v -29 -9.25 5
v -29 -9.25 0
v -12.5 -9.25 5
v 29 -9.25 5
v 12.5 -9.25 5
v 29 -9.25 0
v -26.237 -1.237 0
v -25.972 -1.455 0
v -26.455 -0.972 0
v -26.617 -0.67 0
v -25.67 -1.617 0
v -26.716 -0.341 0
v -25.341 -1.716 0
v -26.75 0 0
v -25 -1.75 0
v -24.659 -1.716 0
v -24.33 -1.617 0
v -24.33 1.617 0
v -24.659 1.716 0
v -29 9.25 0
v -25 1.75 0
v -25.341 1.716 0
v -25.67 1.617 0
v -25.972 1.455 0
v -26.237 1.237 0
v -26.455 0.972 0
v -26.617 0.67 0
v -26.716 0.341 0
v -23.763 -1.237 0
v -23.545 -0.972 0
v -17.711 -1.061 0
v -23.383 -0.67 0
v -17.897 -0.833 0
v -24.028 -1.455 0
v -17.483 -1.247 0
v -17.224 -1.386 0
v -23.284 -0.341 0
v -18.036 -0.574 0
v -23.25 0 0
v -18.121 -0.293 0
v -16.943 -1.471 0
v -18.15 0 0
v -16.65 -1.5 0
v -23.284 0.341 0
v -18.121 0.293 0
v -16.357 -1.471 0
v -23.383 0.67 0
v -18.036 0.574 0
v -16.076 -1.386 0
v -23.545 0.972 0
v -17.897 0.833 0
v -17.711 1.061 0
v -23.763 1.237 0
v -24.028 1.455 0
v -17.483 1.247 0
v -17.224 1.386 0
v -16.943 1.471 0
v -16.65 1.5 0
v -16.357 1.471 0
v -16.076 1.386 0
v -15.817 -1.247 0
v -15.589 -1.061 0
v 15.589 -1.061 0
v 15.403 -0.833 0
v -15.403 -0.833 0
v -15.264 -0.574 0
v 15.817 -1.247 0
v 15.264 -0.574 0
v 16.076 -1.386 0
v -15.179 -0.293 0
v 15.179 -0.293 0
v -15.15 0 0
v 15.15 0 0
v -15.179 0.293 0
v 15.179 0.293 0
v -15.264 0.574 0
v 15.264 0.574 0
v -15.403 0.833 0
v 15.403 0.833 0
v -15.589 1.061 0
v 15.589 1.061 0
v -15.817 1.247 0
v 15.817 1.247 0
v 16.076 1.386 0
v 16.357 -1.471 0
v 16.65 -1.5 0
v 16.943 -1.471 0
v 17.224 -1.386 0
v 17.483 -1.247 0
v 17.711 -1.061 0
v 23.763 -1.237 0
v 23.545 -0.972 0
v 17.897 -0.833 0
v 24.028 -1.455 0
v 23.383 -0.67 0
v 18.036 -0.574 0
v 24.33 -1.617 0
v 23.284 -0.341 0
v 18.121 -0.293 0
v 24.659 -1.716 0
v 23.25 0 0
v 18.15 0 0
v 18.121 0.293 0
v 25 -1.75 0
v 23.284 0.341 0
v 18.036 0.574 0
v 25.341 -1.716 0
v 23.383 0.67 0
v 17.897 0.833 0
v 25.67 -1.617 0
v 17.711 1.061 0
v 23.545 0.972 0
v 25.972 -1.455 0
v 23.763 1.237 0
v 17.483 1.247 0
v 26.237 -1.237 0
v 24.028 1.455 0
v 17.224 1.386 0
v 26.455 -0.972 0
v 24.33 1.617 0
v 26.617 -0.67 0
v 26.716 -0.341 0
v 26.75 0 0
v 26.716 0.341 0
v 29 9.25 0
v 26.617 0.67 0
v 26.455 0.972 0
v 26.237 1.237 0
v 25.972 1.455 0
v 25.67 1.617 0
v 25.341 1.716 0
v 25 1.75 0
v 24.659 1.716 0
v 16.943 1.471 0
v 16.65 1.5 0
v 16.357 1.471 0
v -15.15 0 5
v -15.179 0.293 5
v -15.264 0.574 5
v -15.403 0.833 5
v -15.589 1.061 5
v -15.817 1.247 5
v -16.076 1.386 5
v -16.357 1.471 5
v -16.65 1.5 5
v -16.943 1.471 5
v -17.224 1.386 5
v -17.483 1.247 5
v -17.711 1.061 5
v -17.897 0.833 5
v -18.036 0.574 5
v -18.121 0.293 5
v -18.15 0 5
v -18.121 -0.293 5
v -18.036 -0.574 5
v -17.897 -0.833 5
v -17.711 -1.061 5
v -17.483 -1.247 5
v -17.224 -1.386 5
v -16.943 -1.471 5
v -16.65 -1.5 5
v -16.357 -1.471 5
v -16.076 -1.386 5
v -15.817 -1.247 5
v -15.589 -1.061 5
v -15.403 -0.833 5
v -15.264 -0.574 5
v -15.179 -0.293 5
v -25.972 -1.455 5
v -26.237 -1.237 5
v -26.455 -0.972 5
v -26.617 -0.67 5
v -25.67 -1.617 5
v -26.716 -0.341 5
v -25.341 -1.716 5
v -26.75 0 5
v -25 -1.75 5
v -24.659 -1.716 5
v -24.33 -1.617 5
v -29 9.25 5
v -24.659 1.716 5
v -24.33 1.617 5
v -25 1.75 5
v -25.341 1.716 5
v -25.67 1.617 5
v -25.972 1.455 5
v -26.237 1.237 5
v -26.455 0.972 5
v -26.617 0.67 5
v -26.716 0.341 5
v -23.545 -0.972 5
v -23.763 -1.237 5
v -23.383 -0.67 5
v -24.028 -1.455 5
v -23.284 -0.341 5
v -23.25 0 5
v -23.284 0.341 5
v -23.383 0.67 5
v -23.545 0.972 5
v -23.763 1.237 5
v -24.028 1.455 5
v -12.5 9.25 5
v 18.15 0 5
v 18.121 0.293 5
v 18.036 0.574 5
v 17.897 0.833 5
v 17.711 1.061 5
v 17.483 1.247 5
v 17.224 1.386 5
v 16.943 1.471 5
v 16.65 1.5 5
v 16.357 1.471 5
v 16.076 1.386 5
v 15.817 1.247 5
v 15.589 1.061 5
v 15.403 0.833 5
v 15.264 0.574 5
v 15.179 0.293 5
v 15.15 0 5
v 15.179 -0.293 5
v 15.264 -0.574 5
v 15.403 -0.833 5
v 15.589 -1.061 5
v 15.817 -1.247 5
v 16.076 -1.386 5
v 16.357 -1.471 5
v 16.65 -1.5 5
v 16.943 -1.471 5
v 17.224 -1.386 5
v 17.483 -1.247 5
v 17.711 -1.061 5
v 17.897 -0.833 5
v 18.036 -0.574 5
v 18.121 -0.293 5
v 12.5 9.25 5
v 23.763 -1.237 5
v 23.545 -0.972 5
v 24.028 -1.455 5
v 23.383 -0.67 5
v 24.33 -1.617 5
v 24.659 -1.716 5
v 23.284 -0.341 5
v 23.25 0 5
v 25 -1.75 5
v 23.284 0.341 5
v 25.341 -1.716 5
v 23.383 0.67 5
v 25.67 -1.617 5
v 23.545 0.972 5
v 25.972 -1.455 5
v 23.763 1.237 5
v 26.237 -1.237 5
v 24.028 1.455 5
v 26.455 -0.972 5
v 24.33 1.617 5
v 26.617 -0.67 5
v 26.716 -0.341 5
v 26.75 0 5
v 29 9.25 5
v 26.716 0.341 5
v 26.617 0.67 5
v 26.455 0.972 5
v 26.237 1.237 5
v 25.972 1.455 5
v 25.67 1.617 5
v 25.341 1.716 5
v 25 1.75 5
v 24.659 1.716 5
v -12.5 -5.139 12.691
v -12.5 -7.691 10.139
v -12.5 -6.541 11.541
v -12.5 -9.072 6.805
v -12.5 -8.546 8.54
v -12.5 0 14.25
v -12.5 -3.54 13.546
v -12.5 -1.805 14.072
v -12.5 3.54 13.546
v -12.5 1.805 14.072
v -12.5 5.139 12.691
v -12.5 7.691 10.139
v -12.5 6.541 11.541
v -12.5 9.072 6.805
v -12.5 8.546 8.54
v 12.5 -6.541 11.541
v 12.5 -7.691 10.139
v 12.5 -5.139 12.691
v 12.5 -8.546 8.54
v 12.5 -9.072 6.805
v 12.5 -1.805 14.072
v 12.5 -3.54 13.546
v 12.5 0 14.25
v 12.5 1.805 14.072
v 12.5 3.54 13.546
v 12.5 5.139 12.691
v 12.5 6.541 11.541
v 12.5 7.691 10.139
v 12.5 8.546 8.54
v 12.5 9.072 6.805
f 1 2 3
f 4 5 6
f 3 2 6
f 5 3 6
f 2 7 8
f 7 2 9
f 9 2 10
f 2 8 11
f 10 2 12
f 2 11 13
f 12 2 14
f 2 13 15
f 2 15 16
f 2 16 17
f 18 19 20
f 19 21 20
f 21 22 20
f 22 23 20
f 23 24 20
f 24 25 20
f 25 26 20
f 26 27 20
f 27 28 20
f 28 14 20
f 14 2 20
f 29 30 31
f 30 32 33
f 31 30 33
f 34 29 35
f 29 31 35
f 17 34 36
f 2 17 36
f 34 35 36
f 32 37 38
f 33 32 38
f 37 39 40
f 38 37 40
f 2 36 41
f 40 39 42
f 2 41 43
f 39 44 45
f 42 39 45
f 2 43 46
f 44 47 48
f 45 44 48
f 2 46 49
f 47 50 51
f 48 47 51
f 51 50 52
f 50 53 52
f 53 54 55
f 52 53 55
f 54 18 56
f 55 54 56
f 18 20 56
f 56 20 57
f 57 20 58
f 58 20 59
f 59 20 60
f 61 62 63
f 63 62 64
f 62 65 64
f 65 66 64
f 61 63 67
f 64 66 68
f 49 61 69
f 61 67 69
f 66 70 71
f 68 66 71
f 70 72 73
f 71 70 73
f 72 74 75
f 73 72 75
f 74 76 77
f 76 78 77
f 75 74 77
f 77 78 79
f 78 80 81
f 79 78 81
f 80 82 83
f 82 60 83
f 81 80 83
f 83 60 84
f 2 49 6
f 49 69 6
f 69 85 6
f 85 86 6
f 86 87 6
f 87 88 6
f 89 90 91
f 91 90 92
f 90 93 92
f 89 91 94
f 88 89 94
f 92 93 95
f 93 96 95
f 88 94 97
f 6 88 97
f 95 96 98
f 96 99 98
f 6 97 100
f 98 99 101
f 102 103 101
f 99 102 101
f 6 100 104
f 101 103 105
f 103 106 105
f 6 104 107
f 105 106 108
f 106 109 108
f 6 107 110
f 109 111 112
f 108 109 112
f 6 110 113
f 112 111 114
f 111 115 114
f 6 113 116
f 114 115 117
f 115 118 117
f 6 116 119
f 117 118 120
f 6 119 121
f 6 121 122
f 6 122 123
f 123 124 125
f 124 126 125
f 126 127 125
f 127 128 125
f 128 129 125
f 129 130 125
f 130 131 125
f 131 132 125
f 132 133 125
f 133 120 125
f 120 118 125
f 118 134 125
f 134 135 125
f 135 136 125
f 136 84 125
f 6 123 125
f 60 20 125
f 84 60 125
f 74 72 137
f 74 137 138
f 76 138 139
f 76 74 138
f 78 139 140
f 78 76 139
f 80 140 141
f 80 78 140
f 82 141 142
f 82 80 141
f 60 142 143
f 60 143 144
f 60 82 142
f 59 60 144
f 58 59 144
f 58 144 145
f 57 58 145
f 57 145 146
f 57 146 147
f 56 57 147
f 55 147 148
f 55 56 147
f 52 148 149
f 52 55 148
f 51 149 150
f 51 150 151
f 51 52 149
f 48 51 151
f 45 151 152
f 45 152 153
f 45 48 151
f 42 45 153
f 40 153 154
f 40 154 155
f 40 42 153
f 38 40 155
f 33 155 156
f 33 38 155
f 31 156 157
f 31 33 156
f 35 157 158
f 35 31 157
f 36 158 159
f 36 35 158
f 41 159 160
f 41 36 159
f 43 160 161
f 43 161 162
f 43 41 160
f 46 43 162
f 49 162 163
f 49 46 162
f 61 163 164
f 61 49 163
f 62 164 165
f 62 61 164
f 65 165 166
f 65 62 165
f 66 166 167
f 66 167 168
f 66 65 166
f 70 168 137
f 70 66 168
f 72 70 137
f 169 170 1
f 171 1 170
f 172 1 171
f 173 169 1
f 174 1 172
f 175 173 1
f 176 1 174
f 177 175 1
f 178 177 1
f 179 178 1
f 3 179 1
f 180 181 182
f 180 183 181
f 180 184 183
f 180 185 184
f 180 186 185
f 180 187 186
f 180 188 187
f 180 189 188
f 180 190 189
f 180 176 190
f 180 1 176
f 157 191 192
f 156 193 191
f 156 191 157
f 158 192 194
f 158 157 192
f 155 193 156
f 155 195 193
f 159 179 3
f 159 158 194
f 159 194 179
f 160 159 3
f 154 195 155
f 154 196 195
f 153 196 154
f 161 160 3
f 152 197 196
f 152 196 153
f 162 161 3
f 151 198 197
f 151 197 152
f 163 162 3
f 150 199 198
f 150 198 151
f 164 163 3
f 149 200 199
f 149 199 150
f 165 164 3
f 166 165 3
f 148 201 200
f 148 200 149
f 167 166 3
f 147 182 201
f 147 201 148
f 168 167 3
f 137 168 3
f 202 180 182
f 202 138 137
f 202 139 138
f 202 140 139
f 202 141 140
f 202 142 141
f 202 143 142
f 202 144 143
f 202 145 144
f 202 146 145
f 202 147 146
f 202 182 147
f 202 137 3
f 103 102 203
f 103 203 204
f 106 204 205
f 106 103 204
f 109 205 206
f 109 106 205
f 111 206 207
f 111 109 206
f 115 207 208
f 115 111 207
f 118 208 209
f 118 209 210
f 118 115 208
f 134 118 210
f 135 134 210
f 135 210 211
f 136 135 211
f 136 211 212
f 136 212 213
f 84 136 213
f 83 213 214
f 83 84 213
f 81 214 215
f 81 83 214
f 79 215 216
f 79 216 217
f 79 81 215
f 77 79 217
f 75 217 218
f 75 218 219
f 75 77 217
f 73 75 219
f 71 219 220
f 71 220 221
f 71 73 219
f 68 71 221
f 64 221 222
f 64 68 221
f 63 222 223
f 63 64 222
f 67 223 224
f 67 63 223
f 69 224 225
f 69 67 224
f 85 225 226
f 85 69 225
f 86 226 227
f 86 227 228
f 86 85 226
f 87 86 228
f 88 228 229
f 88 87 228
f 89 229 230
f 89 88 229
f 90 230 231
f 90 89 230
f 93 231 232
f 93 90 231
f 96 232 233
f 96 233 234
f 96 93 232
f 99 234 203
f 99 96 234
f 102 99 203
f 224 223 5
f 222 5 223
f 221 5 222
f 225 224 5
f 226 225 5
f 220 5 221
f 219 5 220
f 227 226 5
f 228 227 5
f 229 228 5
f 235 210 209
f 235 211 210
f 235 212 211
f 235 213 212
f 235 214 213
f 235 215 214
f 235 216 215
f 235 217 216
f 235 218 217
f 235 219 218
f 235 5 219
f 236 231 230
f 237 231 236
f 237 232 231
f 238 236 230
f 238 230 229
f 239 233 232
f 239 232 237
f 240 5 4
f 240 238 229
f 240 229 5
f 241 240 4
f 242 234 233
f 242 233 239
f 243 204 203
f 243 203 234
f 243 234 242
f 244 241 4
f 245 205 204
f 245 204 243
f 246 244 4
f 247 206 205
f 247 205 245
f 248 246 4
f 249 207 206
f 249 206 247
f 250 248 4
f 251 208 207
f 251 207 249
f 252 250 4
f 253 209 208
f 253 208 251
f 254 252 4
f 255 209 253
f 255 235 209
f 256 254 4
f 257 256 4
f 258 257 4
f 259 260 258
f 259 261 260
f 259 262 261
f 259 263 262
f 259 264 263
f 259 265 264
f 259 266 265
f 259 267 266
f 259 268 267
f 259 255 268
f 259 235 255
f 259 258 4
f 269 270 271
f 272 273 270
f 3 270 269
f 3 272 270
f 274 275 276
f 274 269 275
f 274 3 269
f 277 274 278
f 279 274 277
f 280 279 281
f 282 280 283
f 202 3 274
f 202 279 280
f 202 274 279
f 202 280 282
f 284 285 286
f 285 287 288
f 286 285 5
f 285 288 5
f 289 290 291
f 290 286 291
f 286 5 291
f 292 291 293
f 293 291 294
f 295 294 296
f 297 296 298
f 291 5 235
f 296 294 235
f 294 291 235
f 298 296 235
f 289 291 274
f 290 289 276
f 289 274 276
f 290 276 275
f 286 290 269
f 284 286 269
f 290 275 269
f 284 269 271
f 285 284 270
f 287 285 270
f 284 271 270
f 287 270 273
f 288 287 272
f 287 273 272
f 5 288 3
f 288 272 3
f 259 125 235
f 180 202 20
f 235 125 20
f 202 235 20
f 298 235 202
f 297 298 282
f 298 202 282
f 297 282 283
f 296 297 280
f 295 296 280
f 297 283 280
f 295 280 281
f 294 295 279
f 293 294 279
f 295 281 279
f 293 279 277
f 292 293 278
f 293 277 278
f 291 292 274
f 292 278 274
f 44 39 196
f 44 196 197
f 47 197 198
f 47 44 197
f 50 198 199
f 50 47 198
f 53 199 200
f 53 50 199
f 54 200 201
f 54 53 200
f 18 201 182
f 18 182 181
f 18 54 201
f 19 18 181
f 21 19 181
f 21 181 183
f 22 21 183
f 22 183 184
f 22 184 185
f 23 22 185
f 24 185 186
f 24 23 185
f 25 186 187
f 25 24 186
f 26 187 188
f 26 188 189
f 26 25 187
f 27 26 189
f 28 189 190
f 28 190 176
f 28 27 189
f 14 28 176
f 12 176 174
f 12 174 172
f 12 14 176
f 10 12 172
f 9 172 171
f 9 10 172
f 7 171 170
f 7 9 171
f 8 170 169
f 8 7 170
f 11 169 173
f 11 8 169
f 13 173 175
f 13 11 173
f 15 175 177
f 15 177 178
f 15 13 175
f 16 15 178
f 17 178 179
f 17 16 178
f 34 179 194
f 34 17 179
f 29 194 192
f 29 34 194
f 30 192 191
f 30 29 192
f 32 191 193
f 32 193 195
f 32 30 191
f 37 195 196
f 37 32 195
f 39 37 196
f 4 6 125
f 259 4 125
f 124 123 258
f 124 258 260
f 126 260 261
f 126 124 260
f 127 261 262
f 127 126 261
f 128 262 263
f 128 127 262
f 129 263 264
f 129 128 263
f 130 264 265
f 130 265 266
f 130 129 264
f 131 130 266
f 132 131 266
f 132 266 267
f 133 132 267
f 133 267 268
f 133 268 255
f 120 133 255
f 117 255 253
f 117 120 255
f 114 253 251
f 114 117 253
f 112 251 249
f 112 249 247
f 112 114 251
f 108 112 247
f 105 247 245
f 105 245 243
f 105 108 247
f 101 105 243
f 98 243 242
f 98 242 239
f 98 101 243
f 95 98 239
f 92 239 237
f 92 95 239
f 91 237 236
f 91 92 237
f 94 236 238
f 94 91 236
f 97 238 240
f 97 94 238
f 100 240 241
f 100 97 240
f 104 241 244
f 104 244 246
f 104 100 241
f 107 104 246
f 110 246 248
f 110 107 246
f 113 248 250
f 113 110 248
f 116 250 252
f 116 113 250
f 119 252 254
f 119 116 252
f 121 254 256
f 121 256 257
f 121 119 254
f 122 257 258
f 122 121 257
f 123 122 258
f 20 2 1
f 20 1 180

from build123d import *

# Parameters (mm, degrees)
F0_W     = 38
F0_H     = 18.5
F0_R     = 1.5
F0_W_2   = 10
F0_R_2   = 1.75
F1_DEPTH = 5
F2_W     = 25
F2_H     = 18.5
F3_DEPTH = 9.25
F5_DEPTH = 25


with BuildPart() as f1:
    # F0 (on Top) → F1 (new body)
    with BuildSketch(Plane.XY):
        Rectangle(F0_W, F0_H)
        with Locations((-16.65, 0)):
            Circle(F0_R, mode=Mode.SUBTRACT)
        with Locations((16.65, 0)):
            Circle(F0_R, mode=Mode.SUBTRACT)
        with Locations((24, 0)):
            Rectangle(F0_W_2, F0_H)
        with Locations((25, 0)):
            Circle(F0_R_2, mode=Mode.SUBTRACT)
        with Locations((-24, 0)):
            Rectangle(F0_W_2, F0_H)
        with Locations((-25, 0)):
            Circle(F0_R_2, mode=Mode.SUBTRACT)
    extrude(amount=F1_DEPTH)

    # F2 (on face) → F3 (join)
    with BuildSketch(Plane.XY.offset(5)):
        Rectangle(F2_W, F2_H)
    extrude(amount=F3_DEPTH)

    # F4 (on face) → F5 (cut)
    with BuildSketch(Plane(origin=(-12.5, 0, 0), x_dir=(0, -1, 0), z_dir=(-1, 0, 0))):
        with BuildLine():
            ThreePointArc((-9.25, 5), (-6.540737726, 11.540737726), (0, 14.25))
            Line((0, 14.25), (-9.25, 14.25))
            Line((-9.25, 14.25), (-9.25, 5))
        make_face()
        with BuildLine():
            ThreePointArc((0, 14.25), (6.540737726, 11.540737726), (9.25, 5))
            Line((9.25, 5), (9.25, 14.25))
            Line((9.25, 14.25), (0, 14.25))
        make_face()
    extrude(amount=-F5_DEPTH, mode=Mode.SUBTRACT)


solid = f1.part
